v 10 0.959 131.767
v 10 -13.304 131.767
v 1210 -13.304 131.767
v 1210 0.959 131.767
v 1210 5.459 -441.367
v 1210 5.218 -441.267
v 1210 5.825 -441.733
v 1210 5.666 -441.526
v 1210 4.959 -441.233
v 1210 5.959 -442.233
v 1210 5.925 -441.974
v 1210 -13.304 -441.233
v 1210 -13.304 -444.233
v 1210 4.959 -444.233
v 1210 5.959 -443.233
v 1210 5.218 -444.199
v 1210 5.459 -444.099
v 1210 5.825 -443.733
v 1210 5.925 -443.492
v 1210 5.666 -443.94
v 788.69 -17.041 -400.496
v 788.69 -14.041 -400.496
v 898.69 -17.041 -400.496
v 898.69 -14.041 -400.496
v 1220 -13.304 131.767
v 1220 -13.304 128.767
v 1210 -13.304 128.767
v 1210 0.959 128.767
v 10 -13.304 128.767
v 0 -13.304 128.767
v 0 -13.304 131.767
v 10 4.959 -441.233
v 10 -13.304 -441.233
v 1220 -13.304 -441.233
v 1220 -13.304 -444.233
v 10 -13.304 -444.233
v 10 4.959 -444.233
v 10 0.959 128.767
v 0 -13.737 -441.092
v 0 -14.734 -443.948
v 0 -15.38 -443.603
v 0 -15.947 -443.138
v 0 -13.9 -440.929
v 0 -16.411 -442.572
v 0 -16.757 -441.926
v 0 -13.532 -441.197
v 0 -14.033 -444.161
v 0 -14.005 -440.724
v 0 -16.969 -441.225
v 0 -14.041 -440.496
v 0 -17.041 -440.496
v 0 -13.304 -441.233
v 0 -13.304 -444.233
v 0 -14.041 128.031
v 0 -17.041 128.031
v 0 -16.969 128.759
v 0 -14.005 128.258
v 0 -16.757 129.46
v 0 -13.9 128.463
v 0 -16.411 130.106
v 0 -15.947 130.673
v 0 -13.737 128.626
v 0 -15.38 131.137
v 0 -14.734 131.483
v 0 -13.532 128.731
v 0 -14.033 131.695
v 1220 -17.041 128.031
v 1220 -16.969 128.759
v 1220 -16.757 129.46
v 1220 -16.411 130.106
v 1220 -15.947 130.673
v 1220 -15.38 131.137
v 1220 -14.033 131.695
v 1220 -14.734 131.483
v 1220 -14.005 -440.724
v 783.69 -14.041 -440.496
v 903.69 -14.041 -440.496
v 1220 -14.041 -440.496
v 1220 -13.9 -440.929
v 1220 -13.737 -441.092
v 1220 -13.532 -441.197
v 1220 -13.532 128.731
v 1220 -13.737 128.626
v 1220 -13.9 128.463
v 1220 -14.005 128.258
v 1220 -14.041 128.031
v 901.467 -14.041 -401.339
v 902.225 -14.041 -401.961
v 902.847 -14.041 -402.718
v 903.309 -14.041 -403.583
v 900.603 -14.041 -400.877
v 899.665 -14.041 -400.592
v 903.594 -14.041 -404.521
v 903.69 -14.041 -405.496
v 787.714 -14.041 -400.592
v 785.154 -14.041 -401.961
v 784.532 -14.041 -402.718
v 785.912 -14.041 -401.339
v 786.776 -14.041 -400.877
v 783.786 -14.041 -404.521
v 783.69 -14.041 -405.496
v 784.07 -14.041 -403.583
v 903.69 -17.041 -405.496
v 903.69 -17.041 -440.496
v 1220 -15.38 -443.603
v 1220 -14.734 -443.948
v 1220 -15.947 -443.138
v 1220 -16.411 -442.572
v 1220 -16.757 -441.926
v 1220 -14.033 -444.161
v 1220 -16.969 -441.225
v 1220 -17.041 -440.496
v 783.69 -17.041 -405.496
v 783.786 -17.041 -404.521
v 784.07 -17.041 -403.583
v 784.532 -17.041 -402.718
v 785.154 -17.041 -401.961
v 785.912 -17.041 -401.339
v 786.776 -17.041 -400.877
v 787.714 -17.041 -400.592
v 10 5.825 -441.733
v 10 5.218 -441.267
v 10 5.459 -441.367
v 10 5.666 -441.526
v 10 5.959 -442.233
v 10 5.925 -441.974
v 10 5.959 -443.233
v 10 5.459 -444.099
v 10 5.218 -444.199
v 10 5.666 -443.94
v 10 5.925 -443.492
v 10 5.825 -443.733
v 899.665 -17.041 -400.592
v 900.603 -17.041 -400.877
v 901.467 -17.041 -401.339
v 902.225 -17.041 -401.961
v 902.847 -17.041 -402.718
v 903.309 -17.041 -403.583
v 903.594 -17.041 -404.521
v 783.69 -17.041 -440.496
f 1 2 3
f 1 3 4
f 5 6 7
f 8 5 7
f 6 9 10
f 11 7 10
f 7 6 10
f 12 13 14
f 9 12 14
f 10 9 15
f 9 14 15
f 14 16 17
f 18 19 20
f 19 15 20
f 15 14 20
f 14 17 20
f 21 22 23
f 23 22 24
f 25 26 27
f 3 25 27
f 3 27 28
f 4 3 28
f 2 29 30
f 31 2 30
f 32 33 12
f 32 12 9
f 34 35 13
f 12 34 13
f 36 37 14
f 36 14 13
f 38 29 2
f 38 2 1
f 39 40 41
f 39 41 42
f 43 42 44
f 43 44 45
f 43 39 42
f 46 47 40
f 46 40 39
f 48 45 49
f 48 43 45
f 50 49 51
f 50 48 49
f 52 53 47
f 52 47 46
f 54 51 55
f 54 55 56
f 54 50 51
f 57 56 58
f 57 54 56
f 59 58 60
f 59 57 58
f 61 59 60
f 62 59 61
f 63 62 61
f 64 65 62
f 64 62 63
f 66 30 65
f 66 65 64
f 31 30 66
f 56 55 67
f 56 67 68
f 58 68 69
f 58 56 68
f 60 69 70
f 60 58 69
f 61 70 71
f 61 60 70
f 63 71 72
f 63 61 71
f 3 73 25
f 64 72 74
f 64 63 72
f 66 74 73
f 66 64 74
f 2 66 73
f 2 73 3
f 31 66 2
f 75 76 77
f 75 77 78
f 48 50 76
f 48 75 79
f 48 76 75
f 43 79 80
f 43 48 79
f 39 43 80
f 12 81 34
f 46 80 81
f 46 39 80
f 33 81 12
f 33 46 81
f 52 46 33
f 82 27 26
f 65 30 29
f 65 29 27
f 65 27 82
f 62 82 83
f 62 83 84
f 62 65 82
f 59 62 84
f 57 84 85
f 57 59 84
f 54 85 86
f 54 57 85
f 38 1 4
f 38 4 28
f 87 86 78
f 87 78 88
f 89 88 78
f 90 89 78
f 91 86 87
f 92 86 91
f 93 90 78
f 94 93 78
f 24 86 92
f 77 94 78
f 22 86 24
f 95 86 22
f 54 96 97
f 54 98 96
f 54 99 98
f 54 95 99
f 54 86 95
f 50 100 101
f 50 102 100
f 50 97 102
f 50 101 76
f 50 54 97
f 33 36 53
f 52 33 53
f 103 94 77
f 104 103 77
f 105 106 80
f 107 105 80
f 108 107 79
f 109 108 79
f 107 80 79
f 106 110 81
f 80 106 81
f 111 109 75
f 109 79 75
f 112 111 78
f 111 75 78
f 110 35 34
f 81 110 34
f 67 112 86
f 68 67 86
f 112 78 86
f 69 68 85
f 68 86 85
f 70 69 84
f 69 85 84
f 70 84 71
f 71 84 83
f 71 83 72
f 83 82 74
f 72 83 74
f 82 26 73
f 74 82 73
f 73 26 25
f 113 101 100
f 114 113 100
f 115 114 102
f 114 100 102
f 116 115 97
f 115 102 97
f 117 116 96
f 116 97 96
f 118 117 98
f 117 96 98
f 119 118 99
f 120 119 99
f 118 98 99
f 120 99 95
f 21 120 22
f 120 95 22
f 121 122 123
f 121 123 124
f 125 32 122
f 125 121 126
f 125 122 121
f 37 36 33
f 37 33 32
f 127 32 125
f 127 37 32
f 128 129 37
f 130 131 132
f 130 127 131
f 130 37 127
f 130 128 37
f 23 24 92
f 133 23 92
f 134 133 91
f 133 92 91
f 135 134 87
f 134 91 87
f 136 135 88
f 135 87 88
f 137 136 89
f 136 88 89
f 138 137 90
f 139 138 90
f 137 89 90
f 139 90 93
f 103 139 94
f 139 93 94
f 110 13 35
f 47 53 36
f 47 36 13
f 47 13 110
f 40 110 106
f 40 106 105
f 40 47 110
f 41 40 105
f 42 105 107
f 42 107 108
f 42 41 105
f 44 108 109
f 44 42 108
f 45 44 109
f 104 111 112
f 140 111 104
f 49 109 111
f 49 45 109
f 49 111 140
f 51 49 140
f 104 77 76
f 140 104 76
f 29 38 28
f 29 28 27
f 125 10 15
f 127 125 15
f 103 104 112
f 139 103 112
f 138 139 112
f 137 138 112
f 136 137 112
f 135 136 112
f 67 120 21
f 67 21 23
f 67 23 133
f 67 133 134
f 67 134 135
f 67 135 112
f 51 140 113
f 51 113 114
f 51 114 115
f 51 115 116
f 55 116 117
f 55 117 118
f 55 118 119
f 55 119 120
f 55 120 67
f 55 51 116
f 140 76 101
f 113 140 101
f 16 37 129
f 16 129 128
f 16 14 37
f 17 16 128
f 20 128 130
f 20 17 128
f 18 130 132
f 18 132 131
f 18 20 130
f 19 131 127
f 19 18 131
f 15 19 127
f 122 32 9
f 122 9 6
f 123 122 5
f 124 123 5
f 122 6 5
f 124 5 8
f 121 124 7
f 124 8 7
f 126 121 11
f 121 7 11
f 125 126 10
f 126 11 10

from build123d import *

# Parameters (mm, degrees)
BASE_FLANGE1_DEPTH = 1220
SKETCH6_W          = 10
SKETCH6_H          = 19.2634
CUT_EXTRUDE1_DEPTH = 1350.246604201
CUT_EXTRUDE2_REACH = 1300.516
FILLET1_R          = 1


# Sheet-metal steps are written as plain solids
with BuildPart() as part:
    # Sketch1 → Base-Flange1 (new body)
    with BuildSketch(Plane(origin=(0, 0, 0), x_dir=(0, 0, -1), z_dir=(1, 0, 0))):
        with BuildLine():
            Line((-128.767123288, 0.95890411), (-128.767123288, -13.30449589))
            ThreePointArc((-128.767123288, -13.30449589), (-128.551378143, -13.825350745), (-128.030523288, -14.04109589))
            Line((-128.030523288, -14.04109589), (440.496276712, -14.04109589))
            ThreePointArc((440.496276712, -14.04109589), (441.017131567, -13.825350745), (441.232876712, -13.30449589))
            Line((441.232876712, -13.30449589), (441.232876712, 5.95890411))
            Line((441.232876712, 5.95890411), (444.232876712, 5.95890411))
            Line((444.232876712, 5.95890411), (444.232876712, -13.30449589))
            ThreePointArc((444.232876712, -13.30449589), (443.138451911, -15.946671089), (440.496276712, -17.04109589))
            Line((440.496276712, -17.04109589), (-128.030523288, -17.04109589))
            ThreePointArc((-128.030523288, -17.04109589), (-130.672698486, -15.946671089), (-131.767123288, -13.30449589))
            Line((-131.767123288, -13.30449589), (-131.767123288, 0.95890411))
            Line((-131.767123288, 0.95890411), (-128.767123288, 0.95890411))
        make_face()
    extrude(amount=BASE_FLANGE1_DEPTH)

    # Sketch6 → Cut-Extrude1 (cut, through all)
    with BuildSketch(Plane(origin=(0, 0, -444.232876712), x_dir=(-1, 0, 0), z_dir=(0, 0, -1))):
        with Locations((-1215, -3.67279589)):
            Rectangle(SKETCH6_W, SKETCH6_H)
        with Locations((-5, -3.67279589)):
            Rectangle(SKETCH6_W, SKETCH6_H)
    extrude(amount=-CUT_EXTRUDE1_DEPTH, mode=Mode.SUBTRACT)

    # Sketch8 → Cut-Extrude2 (cut, up to next)
    with BuildSketch(Plane(origin=(0, -14.04109589, 0), x_dir=(1, 0, 0), z_dir=(0, 1, 0)), mode=Mode.PRIVATE) as cut_extrude2_sk1:
        with BuildLine():
            Line((903.689592114, 440.496276712), (783.689592114, 440.496276712))
            Line((783.689592114, 440.496276712), (783.689592114, 405.496276712))
            ThreePointArc((783.689592114, 405.496276712), (785.154058208, 401.960742806), (788.689592114, 400.496276712))
            Line((788.689592114, 400.496276712), (898.689592114, 400.496276712))
            ThreePointArc((898.689592114, 400.496276712), (902.22512602, 401.960742806), (903.689592114, 405.496276712))
            Line((903.689592114, 405.496276712), (903.689592114, 440.496276712))
        make_face()
    cut_extrude2_tool1 = extrude(cut_extrude2_sk1.sketch, amount=-CUT_EXTRUDE2_REACH, mode=Mode.PRIVATE) & part.part
    add(cut_extrude2_tool1.solids().sort_by_distance((843.689592, -14.041096, -420.538583))[0], mode=Mode.SUBTRACT)

    # Fillet1
    fillet1_edges = [part.edges().sort_by_distance(p)[0] for p in [
        (610, 5.95890411, -441.232876712),
        (610, 5.95890411, -444.232876712),
    ]]
    fillet(fillet1_edges, radius=FILLET1_R)


solid = part.part
